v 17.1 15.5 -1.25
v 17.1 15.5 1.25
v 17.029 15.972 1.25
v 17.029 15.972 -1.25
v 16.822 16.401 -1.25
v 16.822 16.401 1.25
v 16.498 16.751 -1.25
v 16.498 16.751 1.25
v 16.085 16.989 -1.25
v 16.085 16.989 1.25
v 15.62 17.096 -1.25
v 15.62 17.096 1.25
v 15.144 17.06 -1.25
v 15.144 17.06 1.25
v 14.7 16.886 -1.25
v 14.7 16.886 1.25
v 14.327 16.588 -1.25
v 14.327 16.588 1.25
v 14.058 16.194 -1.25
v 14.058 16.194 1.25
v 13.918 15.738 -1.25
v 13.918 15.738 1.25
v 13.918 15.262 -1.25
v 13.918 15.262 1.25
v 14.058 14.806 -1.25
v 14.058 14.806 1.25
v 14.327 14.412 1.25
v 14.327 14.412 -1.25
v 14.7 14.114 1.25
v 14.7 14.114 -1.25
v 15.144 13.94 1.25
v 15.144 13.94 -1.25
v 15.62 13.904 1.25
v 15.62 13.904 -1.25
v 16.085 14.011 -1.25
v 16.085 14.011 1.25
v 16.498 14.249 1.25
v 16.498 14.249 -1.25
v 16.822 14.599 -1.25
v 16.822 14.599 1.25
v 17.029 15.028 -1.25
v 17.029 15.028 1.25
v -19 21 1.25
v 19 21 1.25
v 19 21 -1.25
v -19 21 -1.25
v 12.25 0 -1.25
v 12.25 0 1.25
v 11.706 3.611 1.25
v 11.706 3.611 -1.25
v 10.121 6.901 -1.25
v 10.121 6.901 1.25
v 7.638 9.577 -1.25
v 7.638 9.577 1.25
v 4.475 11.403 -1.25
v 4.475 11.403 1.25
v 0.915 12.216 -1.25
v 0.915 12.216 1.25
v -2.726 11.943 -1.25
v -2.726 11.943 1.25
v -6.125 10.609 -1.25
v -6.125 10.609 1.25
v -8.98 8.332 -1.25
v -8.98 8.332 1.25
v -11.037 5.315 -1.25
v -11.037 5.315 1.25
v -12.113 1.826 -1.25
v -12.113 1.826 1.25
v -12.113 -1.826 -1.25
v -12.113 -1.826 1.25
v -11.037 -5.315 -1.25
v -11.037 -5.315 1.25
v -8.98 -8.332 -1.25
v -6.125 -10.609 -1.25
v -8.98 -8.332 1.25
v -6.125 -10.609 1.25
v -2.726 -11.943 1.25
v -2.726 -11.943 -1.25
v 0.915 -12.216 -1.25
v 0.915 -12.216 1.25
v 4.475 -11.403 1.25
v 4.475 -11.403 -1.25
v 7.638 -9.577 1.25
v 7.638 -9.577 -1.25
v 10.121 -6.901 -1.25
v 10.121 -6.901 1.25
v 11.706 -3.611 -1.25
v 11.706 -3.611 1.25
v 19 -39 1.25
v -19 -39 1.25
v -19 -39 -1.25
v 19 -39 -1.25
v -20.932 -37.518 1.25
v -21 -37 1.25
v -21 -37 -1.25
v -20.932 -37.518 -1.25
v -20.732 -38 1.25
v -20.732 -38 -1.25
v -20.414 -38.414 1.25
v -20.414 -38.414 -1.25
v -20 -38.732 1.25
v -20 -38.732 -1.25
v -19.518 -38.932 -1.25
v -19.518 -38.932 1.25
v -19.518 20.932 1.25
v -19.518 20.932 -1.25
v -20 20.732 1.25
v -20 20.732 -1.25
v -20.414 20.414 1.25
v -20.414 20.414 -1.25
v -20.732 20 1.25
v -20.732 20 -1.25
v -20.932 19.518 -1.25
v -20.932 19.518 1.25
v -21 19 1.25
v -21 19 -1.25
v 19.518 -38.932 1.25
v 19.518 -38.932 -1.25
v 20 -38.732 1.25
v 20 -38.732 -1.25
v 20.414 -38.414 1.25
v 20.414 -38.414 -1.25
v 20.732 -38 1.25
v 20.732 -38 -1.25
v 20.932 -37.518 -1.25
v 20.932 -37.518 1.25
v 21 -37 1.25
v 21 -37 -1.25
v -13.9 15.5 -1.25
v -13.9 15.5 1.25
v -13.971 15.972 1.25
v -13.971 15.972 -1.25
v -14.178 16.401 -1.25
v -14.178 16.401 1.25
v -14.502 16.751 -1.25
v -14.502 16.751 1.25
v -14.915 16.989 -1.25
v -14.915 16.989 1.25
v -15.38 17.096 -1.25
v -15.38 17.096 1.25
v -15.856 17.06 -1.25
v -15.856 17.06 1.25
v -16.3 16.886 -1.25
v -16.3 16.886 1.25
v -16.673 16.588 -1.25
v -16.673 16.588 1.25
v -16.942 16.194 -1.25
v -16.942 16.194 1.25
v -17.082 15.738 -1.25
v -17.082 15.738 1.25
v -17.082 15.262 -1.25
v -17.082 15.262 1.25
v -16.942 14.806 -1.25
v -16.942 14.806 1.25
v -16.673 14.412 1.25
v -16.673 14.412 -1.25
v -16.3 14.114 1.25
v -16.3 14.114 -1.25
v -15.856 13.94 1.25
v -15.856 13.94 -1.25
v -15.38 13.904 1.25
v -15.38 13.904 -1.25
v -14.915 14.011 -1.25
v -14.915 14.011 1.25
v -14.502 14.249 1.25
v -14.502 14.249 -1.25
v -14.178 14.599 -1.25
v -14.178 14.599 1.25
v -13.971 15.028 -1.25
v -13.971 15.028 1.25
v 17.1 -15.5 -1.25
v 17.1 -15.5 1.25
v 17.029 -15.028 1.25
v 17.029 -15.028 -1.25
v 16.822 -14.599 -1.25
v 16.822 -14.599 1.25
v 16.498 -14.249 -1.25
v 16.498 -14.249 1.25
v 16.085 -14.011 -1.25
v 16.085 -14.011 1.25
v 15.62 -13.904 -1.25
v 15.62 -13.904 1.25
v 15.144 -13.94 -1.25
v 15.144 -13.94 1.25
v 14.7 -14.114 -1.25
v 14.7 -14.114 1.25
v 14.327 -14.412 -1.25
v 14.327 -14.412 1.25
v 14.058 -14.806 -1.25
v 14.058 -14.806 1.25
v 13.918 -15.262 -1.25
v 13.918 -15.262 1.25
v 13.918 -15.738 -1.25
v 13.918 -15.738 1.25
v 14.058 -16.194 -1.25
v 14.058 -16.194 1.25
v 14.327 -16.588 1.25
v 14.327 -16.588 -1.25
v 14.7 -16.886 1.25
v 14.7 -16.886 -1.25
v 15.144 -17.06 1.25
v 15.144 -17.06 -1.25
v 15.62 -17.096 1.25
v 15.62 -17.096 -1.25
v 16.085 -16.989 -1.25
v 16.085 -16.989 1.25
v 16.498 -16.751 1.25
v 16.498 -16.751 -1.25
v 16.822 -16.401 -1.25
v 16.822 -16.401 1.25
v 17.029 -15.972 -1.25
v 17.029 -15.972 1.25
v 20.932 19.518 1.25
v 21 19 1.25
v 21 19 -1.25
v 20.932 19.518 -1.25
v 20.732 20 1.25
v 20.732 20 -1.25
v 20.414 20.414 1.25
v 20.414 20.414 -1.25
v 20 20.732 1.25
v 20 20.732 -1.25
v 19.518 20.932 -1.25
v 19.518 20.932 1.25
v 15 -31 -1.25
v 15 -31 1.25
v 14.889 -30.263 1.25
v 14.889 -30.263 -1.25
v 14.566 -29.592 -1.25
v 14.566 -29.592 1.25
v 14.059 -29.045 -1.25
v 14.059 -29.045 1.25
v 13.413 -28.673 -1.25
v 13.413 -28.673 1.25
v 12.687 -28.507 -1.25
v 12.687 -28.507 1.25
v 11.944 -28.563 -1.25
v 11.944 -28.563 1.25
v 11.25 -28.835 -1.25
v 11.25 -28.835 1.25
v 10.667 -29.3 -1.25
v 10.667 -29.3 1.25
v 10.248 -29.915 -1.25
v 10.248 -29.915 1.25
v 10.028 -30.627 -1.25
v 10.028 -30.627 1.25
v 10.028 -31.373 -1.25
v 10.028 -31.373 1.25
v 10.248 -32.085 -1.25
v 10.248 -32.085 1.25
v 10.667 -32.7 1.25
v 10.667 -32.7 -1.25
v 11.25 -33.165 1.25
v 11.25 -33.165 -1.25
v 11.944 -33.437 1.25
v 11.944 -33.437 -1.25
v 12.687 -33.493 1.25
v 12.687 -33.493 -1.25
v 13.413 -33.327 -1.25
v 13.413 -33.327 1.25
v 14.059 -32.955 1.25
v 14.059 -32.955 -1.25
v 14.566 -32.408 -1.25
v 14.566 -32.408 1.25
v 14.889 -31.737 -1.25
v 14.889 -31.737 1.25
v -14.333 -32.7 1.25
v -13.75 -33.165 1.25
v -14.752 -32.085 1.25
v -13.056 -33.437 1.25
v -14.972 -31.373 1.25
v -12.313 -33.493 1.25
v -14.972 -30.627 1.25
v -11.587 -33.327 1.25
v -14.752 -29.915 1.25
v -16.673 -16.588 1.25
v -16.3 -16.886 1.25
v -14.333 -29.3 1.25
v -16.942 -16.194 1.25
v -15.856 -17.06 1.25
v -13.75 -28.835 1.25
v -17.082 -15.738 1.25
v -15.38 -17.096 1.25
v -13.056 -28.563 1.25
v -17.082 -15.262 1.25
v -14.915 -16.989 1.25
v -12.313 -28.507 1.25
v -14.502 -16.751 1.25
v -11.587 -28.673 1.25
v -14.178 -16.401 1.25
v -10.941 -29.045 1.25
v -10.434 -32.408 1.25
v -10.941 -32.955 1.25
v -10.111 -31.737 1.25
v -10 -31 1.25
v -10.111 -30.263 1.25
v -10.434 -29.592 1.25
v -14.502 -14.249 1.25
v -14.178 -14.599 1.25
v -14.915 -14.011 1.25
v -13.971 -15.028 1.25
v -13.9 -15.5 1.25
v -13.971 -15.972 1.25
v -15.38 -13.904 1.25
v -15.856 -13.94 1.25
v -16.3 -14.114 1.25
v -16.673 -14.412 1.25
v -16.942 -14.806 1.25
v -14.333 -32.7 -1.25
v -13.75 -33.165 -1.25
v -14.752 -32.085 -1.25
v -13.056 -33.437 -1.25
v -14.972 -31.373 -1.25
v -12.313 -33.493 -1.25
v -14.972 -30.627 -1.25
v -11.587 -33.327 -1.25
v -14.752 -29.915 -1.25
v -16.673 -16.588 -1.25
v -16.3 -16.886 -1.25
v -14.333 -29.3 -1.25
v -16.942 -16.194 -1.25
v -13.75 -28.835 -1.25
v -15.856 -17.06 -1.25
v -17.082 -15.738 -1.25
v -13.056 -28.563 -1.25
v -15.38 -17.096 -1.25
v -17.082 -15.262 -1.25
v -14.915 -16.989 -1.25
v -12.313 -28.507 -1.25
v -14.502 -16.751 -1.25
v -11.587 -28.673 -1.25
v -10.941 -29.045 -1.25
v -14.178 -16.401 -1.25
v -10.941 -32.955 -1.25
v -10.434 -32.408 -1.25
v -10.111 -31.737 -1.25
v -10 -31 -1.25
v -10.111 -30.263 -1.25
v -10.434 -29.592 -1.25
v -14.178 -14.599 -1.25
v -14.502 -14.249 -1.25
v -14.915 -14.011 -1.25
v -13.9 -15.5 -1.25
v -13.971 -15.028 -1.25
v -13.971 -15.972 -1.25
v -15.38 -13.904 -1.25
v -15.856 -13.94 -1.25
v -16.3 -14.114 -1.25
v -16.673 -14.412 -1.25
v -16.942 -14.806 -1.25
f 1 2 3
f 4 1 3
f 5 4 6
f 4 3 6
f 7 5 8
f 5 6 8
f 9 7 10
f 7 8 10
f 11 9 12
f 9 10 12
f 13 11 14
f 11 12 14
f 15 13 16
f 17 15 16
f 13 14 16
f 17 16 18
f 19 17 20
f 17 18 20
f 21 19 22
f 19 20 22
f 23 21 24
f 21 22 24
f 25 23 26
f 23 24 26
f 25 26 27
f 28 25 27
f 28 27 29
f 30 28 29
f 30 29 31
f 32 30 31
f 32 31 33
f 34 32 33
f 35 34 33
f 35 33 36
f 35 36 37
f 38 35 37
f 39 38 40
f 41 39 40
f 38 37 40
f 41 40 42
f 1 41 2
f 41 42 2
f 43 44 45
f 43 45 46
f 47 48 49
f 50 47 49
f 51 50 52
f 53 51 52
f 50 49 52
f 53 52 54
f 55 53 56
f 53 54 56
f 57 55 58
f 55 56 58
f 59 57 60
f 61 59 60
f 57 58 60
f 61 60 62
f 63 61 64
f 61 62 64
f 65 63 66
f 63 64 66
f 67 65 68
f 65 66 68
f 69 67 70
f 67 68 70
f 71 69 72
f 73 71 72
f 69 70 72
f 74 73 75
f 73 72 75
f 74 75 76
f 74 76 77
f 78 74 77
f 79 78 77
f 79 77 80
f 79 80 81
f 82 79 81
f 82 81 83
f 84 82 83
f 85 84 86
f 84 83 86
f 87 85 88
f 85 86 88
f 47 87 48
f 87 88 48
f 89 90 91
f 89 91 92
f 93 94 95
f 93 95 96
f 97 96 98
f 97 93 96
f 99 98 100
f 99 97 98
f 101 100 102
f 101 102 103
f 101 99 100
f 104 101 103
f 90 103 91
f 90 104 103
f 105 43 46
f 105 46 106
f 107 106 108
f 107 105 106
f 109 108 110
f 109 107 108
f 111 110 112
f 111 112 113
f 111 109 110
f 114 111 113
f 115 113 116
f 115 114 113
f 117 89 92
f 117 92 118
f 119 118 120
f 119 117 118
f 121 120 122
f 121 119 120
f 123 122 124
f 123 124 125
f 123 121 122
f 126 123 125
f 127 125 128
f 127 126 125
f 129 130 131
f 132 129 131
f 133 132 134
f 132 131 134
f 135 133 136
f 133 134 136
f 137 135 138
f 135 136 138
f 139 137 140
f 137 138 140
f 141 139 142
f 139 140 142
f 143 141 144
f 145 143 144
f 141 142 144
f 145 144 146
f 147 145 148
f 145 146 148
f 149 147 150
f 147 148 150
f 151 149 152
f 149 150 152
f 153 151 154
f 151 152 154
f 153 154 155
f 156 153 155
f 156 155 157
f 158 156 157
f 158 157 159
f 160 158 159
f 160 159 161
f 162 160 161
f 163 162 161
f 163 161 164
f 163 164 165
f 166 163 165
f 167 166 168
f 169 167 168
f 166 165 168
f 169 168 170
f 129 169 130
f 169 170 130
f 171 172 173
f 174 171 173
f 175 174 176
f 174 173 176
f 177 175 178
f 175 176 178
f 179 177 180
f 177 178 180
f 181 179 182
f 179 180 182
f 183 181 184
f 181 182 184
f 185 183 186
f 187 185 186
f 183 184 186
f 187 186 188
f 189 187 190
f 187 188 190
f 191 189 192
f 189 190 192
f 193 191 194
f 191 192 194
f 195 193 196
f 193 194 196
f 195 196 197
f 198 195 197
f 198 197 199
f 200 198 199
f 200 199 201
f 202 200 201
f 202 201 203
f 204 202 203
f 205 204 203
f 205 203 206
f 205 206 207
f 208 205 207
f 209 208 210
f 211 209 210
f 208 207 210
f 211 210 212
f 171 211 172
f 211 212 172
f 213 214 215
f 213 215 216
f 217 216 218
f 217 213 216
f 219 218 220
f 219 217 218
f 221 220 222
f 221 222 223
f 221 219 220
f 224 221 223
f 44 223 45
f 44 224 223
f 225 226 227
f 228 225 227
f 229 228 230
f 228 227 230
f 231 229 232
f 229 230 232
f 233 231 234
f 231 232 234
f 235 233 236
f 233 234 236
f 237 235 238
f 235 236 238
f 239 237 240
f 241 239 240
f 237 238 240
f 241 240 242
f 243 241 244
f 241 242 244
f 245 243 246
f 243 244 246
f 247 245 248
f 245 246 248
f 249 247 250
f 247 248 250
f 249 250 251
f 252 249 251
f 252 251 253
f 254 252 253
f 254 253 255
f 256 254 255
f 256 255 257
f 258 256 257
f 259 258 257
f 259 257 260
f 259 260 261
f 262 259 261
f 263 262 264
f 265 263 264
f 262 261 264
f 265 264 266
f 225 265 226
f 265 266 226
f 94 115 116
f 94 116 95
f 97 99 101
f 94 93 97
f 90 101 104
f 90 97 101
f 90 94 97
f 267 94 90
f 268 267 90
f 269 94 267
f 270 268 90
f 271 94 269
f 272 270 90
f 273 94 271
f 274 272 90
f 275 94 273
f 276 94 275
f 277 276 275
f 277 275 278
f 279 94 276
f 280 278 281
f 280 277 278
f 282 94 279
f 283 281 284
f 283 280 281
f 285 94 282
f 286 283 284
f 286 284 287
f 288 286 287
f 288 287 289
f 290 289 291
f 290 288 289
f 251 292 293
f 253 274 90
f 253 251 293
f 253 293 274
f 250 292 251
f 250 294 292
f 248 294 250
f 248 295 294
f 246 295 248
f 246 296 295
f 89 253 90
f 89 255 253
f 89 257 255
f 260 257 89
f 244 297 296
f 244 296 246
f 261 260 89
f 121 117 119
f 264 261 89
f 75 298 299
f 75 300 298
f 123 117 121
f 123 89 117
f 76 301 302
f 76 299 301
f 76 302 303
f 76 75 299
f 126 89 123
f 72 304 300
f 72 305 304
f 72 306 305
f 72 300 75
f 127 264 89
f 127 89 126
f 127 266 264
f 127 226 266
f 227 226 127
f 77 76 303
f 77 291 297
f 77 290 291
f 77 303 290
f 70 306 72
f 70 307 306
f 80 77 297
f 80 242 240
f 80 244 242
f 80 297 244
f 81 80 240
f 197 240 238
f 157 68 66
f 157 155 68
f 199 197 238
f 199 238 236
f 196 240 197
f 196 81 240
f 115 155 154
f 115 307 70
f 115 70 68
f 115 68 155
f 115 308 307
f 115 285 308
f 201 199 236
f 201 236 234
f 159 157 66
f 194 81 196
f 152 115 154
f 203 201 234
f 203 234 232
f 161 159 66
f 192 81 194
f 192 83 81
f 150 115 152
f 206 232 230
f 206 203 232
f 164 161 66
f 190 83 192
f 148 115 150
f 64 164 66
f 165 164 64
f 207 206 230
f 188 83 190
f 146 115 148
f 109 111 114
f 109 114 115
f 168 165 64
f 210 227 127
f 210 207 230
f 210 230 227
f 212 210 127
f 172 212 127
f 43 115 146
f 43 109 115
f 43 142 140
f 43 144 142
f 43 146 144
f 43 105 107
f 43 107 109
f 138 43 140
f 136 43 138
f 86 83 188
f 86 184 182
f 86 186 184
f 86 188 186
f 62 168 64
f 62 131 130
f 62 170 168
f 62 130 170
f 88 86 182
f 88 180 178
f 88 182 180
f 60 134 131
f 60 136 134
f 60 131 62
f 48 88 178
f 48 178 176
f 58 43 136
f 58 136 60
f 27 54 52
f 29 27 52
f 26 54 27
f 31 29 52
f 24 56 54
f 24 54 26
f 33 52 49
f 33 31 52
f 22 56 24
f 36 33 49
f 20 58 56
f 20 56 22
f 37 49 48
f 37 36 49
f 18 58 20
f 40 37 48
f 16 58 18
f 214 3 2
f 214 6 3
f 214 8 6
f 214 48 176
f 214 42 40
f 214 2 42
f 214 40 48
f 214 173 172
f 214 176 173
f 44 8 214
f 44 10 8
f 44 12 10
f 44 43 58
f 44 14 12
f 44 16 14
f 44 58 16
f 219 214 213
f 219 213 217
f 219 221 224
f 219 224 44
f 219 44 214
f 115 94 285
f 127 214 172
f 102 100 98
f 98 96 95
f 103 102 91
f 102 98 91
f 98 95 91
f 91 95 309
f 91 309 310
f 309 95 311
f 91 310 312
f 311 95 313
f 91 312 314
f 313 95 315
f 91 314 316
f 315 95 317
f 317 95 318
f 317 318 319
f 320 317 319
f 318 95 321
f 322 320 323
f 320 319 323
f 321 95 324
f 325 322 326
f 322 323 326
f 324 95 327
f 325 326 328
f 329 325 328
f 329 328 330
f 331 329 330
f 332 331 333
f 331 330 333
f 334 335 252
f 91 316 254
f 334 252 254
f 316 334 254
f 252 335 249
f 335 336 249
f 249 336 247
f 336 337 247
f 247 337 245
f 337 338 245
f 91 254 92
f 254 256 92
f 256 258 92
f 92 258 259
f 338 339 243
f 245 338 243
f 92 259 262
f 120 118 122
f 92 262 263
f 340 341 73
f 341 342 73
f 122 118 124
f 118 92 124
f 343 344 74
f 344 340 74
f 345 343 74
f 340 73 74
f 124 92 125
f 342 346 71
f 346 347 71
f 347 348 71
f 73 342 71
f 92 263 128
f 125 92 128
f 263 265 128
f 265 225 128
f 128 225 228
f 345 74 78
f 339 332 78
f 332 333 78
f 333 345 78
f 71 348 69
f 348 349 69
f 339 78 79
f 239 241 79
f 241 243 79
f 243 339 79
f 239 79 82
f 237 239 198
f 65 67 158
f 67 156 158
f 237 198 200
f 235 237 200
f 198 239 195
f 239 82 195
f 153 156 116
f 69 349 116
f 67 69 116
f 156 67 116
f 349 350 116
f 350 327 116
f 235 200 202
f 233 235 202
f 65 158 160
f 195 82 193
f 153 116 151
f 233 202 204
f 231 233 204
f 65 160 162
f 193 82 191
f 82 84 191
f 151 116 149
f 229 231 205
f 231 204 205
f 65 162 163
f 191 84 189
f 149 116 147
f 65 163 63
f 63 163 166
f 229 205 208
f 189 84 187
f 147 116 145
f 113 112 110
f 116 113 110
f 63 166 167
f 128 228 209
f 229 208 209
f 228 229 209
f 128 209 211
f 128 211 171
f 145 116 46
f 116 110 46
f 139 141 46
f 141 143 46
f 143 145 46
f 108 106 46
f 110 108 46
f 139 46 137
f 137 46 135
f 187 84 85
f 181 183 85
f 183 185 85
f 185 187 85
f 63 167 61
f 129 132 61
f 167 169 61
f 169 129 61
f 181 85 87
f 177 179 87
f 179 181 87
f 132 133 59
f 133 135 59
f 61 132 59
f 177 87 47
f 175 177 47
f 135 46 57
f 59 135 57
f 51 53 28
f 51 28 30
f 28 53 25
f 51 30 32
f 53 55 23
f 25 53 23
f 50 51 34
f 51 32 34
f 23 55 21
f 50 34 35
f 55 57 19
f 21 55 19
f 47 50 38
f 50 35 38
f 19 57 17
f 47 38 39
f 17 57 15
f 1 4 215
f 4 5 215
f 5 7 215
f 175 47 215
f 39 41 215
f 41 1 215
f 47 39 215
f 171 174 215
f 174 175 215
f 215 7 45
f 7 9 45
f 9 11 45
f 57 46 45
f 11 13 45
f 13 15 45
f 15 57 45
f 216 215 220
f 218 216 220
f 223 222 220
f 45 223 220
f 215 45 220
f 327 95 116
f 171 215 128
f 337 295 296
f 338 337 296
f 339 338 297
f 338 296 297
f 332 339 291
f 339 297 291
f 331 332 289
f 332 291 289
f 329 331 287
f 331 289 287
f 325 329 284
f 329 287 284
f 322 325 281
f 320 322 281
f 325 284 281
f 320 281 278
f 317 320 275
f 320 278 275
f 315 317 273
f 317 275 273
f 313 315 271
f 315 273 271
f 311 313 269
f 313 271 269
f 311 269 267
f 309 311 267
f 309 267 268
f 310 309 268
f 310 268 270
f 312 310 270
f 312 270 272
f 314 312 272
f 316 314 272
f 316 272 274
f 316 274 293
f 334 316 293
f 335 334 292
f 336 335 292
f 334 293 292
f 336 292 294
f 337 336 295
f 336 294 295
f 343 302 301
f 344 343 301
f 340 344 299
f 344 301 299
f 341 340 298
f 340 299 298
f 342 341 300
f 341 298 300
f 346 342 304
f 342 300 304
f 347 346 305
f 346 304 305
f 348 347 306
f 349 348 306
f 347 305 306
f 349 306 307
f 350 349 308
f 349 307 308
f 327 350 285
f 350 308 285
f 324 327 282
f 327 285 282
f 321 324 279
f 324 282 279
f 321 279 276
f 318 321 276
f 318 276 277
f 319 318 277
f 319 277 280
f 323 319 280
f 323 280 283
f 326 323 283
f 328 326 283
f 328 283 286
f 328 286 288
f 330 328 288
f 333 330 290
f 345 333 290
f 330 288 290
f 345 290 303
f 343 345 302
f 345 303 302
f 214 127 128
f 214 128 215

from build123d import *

# Parameters (mm, degrees)
SKETCH1_R           = 2.5
SKETCH1_R_2         = 1.6
SKETCH1_R_3         = 12.25
BOSS_EXTRUDE1_DEPTH = 2.5


with BuildPart() as part:
    # Sketch1 → Boss-Extrude1 (new body)
    with BuildSketch(Plane.XY.offset(1.25)):
        with BuildLine():
            Line((-21, 19), (-21, -37))
            ThreePointArc((-21, -37), (-20.414213562, -38.414213562), (-19, -39))
            Line((-19, -39), (19, -39))
            ThreePointArc((19, -39), (20.414213562, -38.414213562), (21, -37))
            Line((21, -37), (21, 19))
            ThreePointArc((21, 19), (20.414213562, 20.414213562), (19, 21))
            Line((19, 21), (-19, 21))
            ThreePointArc((-19, 21), (-20.414213562, 20.414213562), (-21, 19))
        make_face()
        with Locations((-12.5, -31)):
            Circle(SKETCH1_R, mode=Mode.SUBTRACT)
        with Locations((-15.5, 15.5)):
            Circle(SKETCH1_R_2, mode=Mode.SUBTRACT)
        with Locations((15.5, -15.5)):
            Circle(SKETCH1_R_2, mode=Mode.SUBTRACT)
        Circle(SKETCH1_R_3, mode=Mode.SUBTRACT)
        with Locations((-15.5, -15.5)):
            Circle(SKETCH1_R_2, mode=Mode.SUBTRACT)
        with Locations((15.5, 15.5)):
            Circle(SKETCH1_R_2, mode=Mode.SUBTRACT)
        with Locations((12.5, -31)):
            Circle(SKETCH1_R, mode=Mode.SUBTRACT)
    extrude(amount=-BOSS_EXTRUDE1_DEPTH)


solid = part.part
